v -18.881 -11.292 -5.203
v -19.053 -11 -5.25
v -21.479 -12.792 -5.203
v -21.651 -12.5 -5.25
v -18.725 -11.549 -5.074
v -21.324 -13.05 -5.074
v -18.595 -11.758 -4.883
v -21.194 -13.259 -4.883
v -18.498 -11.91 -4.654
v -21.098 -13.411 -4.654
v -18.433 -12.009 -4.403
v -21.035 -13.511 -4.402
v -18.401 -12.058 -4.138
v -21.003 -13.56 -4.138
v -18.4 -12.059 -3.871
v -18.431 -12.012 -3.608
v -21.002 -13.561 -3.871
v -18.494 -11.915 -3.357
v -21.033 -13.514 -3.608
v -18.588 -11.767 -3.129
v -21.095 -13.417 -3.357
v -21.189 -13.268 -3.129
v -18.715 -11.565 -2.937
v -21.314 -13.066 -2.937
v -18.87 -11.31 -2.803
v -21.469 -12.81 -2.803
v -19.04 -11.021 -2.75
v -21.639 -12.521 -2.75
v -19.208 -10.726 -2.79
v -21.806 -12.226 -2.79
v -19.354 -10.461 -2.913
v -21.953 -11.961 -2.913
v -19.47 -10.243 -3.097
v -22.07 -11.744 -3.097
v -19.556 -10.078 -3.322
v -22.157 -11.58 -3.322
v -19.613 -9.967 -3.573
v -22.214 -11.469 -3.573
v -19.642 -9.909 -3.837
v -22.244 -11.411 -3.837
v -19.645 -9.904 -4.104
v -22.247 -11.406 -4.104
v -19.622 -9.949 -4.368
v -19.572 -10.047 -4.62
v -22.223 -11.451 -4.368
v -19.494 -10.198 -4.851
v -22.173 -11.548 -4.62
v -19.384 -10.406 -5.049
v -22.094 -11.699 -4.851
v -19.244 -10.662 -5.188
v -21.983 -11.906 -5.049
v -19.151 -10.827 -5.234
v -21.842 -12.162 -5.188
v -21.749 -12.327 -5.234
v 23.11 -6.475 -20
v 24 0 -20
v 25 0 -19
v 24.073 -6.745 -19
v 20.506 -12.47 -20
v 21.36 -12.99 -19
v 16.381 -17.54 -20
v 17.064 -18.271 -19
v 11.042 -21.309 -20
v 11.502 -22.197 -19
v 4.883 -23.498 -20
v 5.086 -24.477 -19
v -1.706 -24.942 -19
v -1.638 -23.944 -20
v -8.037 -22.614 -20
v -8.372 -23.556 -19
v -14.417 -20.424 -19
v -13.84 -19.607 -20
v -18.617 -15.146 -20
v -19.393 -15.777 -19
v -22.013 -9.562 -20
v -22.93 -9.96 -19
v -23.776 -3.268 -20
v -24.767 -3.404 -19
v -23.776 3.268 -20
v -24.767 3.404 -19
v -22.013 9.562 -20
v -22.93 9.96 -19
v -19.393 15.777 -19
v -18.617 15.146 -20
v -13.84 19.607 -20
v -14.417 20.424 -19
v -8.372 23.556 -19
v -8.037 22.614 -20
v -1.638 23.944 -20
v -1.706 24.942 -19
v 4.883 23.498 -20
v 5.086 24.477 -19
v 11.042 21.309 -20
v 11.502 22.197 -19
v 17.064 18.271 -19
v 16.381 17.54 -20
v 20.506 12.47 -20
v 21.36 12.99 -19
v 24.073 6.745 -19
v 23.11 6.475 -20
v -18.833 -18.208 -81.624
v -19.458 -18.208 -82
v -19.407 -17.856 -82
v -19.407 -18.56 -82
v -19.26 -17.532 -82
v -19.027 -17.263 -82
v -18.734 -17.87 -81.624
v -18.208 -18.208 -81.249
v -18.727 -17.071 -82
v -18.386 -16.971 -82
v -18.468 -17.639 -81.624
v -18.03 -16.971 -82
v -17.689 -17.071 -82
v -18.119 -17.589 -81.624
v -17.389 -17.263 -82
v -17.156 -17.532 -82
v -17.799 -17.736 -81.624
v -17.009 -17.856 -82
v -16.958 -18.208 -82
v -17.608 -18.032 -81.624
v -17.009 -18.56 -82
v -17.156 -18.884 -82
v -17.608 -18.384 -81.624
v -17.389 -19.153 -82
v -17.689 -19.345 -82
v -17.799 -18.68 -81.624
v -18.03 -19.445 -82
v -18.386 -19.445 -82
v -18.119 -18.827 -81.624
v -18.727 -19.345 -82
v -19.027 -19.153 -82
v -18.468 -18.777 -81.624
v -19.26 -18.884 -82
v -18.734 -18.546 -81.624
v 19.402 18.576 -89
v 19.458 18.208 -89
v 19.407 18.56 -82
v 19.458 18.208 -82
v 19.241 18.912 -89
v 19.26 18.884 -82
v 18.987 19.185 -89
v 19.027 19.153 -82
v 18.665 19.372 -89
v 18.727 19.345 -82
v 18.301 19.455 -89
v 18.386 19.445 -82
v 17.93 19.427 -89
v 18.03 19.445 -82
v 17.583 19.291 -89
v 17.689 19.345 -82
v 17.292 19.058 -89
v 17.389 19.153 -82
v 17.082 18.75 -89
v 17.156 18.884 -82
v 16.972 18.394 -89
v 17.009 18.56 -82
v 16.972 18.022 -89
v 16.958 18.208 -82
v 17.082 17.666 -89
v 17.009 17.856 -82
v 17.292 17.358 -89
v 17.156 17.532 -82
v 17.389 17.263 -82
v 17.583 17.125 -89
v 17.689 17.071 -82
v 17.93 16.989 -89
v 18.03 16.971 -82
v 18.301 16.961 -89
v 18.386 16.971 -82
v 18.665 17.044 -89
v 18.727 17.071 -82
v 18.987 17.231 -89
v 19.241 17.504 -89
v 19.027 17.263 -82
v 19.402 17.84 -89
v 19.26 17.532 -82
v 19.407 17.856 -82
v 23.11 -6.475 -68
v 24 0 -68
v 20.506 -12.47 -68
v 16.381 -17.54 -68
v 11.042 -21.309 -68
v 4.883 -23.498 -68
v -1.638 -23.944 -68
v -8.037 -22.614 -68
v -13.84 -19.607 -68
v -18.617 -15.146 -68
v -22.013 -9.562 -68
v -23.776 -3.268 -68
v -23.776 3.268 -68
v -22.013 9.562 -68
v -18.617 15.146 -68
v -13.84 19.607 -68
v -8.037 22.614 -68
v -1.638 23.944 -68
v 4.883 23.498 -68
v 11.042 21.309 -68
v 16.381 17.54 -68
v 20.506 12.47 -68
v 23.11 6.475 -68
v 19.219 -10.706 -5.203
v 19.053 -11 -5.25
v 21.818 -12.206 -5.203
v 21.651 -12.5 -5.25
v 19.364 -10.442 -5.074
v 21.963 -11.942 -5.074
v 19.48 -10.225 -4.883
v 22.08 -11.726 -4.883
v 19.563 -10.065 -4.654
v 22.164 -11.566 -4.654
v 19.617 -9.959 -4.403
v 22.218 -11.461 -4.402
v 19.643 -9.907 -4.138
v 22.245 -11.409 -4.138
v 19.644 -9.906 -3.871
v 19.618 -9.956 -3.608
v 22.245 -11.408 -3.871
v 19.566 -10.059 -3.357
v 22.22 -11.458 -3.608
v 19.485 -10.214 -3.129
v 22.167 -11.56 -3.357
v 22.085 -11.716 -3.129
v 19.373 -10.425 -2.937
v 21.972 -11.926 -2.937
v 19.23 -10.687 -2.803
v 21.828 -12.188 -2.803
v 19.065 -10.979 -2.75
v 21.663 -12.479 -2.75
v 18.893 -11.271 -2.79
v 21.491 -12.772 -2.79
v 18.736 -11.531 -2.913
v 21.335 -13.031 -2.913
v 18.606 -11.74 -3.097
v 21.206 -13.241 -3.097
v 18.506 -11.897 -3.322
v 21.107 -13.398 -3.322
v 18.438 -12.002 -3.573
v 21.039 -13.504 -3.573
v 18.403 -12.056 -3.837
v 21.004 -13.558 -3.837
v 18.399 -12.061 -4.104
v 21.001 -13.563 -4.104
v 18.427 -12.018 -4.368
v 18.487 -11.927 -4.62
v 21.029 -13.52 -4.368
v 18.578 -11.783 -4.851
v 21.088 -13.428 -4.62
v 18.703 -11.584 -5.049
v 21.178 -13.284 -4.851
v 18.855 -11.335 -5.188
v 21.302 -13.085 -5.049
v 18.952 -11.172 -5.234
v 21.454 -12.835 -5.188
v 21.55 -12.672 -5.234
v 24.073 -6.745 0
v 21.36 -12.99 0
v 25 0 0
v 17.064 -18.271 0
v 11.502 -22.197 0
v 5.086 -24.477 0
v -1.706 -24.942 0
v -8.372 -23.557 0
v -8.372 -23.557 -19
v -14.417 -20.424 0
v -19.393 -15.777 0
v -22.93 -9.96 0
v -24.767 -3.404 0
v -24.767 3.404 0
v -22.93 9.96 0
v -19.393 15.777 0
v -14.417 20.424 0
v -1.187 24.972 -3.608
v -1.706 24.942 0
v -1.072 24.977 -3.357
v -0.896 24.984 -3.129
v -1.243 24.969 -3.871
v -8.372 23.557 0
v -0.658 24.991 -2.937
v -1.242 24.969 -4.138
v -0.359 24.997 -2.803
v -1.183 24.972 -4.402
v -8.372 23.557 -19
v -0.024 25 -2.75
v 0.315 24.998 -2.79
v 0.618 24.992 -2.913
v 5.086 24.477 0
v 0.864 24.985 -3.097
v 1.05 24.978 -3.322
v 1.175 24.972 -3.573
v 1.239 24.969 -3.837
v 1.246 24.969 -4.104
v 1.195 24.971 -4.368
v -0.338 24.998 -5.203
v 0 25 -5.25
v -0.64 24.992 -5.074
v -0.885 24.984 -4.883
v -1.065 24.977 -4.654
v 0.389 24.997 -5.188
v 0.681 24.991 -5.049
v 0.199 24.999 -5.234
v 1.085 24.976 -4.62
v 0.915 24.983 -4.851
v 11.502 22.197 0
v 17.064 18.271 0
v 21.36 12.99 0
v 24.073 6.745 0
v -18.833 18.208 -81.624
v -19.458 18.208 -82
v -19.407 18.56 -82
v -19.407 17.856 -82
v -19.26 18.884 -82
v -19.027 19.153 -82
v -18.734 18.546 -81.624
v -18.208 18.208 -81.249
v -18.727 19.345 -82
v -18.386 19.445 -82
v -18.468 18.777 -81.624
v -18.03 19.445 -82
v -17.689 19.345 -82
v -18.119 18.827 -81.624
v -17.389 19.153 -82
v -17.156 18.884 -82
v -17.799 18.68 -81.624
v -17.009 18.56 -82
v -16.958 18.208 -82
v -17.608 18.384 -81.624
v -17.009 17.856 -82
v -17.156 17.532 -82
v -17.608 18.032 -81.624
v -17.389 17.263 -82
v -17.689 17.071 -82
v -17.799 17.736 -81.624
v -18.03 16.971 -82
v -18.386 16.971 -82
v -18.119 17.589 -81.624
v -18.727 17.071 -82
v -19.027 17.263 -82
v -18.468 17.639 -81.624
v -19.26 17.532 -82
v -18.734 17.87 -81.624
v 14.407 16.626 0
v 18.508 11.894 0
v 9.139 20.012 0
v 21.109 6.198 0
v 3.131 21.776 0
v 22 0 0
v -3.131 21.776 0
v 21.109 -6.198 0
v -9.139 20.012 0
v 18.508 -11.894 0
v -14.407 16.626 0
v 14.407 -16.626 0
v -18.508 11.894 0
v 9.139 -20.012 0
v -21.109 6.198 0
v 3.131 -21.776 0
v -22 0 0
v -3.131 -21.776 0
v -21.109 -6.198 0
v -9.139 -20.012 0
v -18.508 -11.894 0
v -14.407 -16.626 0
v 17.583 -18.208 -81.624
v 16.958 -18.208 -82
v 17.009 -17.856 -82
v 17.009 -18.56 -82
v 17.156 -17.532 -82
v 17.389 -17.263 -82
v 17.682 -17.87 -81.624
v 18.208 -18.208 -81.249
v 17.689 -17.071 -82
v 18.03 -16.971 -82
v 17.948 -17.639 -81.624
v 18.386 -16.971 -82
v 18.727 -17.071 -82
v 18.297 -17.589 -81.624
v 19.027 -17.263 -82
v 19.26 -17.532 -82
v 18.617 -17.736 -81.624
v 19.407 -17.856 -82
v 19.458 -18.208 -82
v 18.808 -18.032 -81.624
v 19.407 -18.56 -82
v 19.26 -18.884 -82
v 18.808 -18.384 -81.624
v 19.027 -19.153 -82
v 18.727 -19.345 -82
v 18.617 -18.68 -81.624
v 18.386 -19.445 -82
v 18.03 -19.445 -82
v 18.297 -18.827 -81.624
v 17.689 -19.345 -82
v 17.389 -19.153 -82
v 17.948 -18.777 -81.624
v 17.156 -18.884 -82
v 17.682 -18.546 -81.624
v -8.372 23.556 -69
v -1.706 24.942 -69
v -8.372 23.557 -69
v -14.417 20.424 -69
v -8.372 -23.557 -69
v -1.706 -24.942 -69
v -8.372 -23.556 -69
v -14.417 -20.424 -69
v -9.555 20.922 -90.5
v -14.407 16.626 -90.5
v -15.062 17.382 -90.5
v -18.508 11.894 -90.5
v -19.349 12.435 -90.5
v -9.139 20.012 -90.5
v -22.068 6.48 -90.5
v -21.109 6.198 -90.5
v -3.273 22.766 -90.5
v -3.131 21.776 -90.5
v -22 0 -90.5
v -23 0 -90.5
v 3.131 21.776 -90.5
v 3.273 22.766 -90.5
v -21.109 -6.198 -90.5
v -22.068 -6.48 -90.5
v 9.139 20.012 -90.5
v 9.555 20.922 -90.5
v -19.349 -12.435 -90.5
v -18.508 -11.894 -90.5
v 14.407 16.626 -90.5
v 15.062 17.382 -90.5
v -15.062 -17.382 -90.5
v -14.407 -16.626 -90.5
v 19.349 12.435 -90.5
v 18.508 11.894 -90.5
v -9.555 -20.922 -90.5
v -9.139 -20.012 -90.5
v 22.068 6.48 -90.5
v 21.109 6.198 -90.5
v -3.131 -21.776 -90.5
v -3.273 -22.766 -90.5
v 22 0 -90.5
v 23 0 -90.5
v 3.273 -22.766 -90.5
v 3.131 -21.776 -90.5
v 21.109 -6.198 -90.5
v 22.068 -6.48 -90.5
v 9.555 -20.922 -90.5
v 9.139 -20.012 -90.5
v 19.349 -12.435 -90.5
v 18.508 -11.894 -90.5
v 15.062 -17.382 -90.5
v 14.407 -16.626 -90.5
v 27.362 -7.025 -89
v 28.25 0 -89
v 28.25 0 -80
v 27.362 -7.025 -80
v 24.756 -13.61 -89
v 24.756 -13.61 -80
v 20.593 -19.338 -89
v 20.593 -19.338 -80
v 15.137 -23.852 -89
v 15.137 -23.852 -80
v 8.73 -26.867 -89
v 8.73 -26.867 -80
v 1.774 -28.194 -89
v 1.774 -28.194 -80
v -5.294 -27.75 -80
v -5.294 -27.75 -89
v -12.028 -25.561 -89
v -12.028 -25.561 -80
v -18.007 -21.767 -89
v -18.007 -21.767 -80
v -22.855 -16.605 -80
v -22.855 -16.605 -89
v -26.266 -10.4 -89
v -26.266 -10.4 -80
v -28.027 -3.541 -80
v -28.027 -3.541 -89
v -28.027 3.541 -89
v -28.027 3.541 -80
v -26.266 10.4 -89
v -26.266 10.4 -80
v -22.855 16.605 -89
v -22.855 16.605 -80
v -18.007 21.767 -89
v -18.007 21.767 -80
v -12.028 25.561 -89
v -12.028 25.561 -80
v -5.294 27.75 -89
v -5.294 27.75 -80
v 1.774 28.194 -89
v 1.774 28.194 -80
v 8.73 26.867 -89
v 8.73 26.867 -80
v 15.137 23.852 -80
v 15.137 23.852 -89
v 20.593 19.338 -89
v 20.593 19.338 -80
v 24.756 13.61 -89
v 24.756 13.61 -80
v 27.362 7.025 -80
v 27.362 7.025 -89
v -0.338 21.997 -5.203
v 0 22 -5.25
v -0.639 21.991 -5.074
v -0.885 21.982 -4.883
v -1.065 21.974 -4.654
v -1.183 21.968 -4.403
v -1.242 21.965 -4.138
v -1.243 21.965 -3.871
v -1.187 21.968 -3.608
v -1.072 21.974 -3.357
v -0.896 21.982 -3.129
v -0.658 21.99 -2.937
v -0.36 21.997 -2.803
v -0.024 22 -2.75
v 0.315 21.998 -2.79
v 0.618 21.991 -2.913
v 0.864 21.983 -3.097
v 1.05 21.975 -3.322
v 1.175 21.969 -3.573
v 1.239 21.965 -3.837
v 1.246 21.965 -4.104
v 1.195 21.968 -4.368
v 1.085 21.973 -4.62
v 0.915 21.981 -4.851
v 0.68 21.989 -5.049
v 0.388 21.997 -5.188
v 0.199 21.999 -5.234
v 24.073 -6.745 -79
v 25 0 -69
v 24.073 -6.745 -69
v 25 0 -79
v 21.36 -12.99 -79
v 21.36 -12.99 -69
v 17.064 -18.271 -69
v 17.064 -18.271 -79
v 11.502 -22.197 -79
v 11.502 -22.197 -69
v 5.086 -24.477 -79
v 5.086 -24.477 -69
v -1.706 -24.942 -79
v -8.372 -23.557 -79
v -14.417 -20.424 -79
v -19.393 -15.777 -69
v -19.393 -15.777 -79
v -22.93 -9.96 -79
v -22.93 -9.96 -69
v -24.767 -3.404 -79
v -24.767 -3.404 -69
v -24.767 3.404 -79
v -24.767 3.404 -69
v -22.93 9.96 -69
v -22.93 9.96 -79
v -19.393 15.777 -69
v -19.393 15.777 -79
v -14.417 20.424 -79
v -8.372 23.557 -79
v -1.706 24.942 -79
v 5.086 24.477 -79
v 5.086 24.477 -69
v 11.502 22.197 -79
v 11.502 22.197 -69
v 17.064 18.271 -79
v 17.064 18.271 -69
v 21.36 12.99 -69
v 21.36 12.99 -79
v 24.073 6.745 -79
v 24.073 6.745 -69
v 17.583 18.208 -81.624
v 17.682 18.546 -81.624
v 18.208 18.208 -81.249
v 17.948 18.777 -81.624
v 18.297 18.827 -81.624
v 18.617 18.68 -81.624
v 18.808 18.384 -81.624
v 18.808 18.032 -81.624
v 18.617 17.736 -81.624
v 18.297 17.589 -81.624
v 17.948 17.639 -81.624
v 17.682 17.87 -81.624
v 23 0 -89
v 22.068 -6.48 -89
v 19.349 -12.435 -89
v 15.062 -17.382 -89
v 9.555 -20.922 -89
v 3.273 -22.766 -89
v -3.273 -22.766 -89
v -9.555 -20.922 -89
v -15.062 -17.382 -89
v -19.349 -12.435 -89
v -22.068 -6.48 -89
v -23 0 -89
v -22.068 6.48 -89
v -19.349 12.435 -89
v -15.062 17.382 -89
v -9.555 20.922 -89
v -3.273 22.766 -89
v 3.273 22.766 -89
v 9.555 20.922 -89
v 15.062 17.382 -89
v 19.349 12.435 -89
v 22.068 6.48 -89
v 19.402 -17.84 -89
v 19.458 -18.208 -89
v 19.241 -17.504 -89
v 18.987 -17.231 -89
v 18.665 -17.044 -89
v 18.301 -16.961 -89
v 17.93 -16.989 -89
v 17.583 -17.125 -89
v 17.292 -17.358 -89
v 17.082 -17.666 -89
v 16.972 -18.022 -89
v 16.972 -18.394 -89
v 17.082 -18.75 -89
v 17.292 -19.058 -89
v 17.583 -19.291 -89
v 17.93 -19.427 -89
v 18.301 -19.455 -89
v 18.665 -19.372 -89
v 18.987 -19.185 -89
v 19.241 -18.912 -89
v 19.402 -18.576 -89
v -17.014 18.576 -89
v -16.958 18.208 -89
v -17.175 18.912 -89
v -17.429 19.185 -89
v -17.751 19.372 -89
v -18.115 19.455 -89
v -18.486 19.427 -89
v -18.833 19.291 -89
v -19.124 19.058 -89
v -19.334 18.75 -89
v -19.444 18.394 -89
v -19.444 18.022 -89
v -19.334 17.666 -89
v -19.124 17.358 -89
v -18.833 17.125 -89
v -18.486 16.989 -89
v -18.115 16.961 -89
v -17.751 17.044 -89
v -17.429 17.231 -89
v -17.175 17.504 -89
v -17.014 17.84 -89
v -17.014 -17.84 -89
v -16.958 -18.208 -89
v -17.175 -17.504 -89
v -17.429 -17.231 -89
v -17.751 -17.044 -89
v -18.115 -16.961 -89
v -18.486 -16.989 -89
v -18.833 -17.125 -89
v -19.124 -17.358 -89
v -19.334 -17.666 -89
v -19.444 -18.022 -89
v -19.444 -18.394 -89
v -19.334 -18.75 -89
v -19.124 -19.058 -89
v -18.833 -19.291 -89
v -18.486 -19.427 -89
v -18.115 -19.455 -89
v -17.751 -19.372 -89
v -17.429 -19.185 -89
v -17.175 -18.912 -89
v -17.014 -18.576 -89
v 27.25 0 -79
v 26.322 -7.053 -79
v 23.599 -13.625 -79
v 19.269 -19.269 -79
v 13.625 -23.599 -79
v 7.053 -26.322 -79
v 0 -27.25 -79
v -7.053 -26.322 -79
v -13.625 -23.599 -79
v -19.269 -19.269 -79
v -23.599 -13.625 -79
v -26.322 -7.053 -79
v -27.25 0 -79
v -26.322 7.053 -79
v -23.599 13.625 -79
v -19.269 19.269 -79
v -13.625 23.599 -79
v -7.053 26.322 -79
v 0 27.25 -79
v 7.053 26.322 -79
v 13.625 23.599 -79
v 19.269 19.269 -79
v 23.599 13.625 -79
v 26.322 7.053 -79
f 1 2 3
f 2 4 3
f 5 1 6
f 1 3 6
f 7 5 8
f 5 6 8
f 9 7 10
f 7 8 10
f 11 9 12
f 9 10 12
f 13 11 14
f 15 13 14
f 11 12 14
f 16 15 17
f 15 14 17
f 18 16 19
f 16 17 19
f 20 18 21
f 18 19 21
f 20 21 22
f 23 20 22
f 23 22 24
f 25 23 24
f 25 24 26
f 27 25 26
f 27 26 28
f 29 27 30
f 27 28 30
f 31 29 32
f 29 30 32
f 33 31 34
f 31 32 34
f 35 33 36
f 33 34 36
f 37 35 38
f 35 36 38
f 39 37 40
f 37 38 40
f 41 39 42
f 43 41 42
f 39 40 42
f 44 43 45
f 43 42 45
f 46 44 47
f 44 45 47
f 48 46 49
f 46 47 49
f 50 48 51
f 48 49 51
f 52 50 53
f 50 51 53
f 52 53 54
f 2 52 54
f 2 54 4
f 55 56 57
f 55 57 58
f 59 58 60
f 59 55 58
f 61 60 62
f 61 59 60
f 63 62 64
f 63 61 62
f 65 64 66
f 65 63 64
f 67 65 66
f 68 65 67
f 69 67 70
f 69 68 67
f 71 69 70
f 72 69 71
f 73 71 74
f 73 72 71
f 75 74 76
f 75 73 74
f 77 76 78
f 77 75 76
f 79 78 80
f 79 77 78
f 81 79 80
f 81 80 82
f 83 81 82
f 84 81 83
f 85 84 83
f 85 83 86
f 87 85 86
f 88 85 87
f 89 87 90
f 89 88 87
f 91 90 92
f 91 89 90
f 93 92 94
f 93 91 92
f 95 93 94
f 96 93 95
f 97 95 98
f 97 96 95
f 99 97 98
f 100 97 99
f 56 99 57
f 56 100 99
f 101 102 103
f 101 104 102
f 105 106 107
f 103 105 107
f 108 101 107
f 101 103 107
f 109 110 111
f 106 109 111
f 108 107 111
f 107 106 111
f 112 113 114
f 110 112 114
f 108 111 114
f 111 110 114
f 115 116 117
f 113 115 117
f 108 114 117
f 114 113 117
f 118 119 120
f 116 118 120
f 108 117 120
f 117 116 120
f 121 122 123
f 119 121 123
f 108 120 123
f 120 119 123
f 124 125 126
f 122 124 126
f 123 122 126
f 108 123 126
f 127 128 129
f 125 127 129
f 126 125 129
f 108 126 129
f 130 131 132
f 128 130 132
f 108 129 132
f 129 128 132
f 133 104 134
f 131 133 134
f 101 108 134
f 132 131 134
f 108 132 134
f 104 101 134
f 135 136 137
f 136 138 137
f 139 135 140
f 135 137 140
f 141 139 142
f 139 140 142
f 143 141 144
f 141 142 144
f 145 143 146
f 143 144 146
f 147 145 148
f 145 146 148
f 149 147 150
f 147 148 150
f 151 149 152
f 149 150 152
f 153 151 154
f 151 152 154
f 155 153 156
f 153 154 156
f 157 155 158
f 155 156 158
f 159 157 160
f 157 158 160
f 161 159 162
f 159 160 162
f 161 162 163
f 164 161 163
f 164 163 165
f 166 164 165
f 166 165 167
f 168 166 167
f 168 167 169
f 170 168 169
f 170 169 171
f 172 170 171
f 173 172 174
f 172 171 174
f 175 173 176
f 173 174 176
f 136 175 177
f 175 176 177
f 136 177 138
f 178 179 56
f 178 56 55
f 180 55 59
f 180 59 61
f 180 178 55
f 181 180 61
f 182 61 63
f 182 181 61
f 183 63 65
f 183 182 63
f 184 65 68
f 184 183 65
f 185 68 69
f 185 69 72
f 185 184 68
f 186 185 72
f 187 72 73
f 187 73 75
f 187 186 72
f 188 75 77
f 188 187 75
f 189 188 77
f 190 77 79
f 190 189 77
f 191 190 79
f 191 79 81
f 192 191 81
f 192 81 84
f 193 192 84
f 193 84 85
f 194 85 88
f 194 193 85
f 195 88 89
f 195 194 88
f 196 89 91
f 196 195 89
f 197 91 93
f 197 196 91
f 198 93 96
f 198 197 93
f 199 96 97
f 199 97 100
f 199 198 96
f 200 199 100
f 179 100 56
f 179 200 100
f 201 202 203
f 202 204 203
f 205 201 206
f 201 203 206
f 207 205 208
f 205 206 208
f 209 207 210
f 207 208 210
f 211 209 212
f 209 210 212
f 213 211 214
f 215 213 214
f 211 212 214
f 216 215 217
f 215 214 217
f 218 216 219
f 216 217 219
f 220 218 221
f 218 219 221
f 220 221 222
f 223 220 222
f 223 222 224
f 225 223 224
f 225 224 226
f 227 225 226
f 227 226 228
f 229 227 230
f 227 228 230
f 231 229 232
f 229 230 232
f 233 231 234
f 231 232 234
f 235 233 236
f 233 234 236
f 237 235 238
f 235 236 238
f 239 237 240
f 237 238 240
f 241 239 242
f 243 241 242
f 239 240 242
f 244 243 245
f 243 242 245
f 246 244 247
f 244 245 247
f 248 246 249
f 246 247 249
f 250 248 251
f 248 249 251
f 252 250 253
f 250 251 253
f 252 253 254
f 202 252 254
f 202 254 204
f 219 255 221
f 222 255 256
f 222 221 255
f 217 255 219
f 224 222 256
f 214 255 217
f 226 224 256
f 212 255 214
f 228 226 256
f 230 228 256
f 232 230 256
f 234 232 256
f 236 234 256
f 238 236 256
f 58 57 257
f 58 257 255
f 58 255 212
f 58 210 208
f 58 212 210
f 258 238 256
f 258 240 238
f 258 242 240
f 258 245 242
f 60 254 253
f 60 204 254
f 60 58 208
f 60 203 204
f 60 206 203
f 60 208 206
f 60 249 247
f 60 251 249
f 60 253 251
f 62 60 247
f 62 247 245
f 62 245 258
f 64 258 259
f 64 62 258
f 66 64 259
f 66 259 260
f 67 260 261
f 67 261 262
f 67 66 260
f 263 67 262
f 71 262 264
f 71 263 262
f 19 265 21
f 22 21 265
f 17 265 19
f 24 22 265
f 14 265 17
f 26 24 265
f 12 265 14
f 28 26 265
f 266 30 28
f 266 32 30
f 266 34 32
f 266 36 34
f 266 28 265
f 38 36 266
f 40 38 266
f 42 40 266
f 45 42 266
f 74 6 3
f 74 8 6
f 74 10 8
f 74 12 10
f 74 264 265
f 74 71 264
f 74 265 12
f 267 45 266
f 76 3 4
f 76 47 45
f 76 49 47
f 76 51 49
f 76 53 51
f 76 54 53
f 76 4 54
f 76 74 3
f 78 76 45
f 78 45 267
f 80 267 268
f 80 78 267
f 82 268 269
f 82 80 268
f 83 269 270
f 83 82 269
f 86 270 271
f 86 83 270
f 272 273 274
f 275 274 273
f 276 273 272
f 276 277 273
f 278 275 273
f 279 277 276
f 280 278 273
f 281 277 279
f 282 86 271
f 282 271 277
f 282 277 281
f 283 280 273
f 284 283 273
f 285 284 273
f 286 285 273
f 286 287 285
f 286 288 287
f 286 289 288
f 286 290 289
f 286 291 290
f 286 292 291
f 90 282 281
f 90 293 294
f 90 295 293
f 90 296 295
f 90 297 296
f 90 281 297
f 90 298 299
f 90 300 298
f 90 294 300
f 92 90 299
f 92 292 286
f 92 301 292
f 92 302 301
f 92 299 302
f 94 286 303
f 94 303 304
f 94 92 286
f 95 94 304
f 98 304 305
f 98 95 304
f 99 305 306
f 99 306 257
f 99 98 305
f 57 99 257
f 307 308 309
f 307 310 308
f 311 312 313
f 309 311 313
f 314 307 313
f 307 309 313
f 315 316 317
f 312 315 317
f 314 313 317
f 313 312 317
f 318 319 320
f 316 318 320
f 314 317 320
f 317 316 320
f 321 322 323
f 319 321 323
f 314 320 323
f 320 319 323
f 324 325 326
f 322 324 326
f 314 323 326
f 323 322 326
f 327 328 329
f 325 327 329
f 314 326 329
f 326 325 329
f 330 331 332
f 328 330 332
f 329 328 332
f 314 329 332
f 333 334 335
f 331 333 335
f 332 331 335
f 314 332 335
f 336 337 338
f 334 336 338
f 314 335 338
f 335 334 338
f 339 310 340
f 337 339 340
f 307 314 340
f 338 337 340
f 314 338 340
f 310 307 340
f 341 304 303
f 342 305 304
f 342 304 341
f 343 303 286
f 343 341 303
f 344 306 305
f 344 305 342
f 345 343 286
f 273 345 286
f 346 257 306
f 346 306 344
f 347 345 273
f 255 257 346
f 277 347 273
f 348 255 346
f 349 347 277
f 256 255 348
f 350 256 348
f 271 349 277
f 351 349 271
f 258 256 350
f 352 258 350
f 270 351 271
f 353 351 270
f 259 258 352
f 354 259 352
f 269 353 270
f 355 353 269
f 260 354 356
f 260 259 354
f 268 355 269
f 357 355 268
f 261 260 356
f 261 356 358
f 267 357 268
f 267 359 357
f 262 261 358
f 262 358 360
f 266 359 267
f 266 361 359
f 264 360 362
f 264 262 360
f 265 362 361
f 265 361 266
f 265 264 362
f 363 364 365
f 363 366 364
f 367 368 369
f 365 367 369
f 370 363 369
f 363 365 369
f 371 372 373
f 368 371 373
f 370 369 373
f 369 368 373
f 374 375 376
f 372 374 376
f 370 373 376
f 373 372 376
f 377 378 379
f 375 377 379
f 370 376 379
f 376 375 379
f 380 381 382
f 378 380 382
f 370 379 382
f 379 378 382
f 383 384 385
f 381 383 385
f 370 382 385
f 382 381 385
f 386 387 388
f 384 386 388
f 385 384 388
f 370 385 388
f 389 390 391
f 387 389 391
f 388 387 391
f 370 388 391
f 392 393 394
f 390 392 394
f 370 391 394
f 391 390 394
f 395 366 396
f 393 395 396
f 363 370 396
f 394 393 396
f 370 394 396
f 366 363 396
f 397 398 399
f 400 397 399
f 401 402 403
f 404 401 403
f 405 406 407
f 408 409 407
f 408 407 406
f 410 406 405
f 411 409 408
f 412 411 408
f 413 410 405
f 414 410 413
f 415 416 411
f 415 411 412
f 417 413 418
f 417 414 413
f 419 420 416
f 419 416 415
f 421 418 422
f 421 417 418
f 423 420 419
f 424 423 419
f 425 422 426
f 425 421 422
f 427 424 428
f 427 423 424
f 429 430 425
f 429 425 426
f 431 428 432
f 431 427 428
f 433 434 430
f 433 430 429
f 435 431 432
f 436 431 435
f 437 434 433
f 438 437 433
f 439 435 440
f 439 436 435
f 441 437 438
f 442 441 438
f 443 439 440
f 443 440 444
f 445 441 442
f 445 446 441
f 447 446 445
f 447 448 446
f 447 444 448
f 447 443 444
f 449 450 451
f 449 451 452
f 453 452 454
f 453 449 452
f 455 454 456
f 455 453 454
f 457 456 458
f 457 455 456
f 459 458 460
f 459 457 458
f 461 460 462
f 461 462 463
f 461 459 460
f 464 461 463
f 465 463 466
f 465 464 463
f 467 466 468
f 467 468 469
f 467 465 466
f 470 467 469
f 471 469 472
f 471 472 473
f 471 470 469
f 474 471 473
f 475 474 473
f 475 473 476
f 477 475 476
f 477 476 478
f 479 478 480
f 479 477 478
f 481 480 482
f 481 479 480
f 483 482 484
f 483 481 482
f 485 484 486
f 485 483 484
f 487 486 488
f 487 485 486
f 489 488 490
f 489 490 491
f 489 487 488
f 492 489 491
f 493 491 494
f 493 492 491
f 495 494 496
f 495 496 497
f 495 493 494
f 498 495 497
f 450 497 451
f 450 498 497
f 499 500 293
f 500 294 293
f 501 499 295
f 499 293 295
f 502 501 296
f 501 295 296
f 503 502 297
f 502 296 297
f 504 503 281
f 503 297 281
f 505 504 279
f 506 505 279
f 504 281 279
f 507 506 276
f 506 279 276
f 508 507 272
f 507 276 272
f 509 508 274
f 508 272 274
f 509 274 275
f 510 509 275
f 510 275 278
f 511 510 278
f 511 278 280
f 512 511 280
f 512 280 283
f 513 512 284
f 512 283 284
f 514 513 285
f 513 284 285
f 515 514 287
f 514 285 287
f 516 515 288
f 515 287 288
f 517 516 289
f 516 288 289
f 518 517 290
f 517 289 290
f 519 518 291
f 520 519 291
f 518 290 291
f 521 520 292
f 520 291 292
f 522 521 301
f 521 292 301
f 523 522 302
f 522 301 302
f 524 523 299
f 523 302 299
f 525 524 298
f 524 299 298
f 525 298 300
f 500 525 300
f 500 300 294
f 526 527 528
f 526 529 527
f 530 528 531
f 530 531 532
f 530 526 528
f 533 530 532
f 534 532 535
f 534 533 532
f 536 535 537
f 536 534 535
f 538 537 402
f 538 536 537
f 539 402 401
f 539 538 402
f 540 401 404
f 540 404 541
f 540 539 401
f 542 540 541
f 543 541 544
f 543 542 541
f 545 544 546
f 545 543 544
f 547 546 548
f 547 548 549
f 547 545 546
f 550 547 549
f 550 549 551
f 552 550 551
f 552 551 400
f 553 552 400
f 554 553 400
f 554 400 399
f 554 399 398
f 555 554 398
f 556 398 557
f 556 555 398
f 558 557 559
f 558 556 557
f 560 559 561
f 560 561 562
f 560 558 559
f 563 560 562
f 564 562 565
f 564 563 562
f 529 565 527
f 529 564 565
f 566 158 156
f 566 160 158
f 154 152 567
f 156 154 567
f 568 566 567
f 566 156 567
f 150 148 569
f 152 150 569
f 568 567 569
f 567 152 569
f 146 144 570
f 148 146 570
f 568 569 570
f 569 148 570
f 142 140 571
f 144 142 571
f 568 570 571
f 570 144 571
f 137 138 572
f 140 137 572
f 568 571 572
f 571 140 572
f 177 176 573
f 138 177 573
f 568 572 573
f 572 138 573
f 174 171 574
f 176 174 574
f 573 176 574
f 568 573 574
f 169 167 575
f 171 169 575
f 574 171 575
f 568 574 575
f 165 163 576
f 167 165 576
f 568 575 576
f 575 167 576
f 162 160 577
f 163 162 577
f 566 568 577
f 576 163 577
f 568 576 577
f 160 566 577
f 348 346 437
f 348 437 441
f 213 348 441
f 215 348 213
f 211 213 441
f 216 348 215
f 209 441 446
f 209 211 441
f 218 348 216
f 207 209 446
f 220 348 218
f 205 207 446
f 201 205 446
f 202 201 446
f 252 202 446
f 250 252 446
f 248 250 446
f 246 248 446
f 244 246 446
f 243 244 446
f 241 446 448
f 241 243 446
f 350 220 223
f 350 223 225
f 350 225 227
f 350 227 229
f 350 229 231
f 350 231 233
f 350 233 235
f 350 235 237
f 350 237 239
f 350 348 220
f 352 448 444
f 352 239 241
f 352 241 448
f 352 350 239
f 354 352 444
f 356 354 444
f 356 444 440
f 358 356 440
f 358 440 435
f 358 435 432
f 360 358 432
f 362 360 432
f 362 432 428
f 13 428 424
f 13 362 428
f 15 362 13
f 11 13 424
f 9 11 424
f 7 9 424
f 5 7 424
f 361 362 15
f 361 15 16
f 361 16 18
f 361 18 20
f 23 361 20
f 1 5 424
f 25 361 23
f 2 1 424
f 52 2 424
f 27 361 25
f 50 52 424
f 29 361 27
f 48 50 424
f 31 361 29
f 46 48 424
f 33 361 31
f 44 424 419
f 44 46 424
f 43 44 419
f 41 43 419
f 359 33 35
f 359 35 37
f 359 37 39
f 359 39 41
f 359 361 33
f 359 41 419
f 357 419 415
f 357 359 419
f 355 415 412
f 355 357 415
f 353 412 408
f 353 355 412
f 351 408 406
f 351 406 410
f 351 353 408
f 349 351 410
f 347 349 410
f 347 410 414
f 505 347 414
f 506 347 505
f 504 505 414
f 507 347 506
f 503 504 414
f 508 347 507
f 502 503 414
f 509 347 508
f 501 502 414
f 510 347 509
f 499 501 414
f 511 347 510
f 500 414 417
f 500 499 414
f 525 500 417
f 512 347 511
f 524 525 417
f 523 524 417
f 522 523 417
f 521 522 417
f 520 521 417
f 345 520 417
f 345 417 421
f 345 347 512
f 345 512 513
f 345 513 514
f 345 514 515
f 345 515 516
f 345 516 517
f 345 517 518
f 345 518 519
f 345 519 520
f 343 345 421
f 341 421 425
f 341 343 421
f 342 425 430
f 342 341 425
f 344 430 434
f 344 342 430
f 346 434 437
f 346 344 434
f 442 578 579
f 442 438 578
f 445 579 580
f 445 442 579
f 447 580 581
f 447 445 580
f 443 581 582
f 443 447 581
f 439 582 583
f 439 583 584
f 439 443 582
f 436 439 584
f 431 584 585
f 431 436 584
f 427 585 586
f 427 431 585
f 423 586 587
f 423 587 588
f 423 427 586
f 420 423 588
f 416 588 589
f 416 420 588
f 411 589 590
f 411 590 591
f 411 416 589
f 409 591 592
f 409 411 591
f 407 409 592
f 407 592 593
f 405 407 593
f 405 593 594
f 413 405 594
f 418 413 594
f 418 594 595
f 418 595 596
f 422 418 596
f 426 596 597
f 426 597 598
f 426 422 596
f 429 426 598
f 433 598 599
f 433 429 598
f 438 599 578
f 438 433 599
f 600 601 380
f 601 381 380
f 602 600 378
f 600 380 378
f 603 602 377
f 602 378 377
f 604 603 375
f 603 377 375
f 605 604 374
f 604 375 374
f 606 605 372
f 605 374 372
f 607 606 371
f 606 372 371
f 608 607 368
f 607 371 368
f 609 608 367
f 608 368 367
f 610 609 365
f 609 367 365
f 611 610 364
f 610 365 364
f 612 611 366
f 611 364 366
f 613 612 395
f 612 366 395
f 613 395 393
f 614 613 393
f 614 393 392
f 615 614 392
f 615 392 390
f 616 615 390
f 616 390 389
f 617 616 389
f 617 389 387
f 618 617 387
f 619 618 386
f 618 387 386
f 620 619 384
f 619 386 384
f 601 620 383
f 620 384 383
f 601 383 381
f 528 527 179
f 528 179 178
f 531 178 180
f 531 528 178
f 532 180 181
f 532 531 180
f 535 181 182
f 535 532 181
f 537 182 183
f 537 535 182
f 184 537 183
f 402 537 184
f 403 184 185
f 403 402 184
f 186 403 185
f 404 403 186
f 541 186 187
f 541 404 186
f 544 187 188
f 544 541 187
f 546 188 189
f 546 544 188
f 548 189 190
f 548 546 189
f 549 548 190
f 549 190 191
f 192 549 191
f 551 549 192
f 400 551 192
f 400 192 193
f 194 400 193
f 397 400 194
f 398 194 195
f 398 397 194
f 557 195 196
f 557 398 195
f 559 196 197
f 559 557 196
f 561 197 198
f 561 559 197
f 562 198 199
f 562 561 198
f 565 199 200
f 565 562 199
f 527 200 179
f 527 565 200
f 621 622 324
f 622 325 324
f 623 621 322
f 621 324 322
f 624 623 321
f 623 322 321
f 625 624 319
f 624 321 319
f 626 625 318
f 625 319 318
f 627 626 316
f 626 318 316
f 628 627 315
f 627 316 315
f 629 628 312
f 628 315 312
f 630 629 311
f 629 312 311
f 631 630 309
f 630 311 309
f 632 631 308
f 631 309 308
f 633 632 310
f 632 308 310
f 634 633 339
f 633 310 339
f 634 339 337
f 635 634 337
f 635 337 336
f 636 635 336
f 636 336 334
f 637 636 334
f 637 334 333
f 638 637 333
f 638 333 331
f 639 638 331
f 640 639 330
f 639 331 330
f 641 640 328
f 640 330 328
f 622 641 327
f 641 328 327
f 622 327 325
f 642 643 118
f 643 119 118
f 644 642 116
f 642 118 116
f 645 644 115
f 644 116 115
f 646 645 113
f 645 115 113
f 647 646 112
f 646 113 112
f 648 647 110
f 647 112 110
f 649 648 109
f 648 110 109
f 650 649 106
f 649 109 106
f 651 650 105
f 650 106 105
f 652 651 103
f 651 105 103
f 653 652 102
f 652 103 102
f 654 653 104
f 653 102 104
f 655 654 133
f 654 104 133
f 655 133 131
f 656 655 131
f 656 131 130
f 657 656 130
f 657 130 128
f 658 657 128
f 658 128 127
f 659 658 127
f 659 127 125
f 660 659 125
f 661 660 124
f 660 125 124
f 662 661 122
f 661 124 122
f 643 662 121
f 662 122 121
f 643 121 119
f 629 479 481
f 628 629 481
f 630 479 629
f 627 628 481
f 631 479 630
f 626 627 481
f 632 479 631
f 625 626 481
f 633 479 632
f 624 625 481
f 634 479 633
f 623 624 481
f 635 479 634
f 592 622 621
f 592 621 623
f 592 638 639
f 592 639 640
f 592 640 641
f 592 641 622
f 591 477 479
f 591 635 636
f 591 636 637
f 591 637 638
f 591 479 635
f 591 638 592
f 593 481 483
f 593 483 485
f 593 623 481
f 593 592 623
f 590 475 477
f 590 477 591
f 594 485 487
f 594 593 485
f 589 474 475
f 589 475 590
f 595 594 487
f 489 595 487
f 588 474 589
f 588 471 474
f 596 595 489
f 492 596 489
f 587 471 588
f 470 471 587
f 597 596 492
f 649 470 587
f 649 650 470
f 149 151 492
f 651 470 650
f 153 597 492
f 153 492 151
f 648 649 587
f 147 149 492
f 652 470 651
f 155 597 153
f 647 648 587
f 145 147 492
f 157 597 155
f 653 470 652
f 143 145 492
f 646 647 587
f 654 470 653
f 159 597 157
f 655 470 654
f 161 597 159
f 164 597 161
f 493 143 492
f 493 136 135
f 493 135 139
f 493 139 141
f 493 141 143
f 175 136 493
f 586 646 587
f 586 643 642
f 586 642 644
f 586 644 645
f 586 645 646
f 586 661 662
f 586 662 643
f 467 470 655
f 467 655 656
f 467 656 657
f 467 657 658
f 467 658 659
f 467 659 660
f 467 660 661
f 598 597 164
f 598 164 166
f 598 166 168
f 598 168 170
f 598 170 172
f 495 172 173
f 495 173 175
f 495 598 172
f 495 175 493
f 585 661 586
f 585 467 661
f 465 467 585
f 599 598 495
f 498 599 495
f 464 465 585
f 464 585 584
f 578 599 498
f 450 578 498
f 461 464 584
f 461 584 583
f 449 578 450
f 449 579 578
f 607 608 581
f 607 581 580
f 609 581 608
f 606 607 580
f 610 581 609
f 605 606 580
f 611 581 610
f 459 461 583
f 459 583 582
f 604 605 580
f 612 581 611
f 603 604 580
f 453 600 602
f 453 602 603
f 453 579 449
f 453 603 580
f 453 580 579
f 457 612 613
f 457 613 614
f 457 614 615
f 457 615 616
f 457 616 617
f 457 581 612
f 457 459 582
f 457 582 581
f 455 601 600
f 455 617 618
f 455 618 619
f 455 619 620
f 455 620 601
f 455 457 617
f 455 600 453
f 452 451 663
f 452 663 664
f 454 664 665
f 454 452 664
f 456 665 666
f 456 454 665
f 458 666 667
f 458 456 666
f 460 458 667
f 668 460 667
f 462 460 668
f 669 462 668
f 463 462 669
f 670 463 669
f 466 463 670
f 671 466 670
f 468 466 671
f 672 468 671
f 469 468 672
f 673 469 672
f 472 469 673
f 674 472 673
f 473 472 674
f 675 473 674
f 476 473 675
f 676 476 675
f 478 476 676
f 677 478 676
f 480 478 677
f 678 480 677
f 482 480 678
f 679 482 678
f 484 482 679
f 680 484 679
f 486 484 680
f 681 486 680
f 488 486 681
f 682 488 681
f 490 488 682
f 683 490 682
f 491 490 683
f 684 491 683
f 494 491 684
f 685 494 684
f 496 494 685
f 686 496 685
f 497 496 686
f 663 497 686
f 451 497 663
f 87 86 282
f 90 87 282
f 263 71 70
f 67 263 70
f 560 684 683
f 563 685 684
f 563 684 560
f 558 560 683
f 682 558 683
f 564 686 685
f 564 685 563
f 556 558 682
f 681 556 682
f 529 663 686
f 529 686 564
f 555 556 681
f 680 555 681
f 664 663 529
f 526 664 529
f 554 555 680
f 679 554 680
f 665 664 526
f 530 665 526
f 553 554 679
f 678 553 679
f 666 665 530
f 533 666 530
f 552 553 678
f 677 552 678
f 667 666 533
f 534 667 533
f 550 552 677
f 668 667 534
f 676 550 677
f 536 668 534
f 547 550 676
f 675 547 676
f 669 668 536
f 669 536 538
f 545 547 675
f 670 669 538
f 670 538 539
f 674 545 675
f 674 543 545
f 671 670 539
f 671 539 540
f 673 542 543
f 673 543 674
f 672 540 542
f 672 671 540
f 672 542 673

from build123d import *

# Parameters (mm, degrees)
HOLE_WIZARD_M3_1_D       = 2.5
HOLE_WIZARD_M3_1_DEPTH   = 7
HOLE_WIZARD_M3_1_TIP     = 0.751075774
CHAMFER_2_SIZE           = 1
SKETCH_20_W              = 1.25
SKETCH_20_H              = 28.25
PATTERN_CIRCULAR_1_COUNT = 3


with BuildPart() as part:
    # 草图1 → 旋转1 (revolve)
    with BuildSketch(Plane(origin=(0, 0, 0), x_dir=(1, 0, 0), z_dir=(0, 1, 0))):
        Polygon((25, 0), (25, 19), (24, 19), (24, 69), (25, 69), (25, 79), (28.25, 79), (28.25, 89), (23, 89), (23, 90.5), (22, 90.5), (22, 0), align=None)
    revolve(axis=Axis((0, 0, 0), (0, 0, -1)))

    # M3 螺纹孔1
    with Locations(Plane(origin=(0, 0, -89), x_dir=(-1, 0, 0), z_dir=(0, 0, -1))):
        with Locations((-18.207999616, 18.207999616), (18.207999616, 18.207999616), (18.207999616, -18.207999616), (-18.207999616, -18.207999616)):
            Hole(HOLE_WIZARD_M3_1_D / 2, depth=HOLE_WIZARD_M3_1_DEPTH)
            with Locations((0, 0, -(HOLE_WIZARD_M3_1_DEPTH + HOLE_WIZARD_M3_1_TIP / 2))):  # 118° drill point
                Cone(0, HOLE_WIZARD_M3_1_D / 2, HOLE_WIZARD_M3_1_TIP, mode=Mode.SUBTRACT)

    # 倒角2
    chamfer_2_edges = [part.edges().sort_by_distance(p)[0] for p in [
        (-28.25, 0, -79),
        (-24, 0, -69),
        (-24, 0, -19),
    ]]
    chamfer(chamfer_2_edges, length=CHAMFER_2_SIZE - 0.0001)  # a hair under: the kernel refuses the full size

    # 草图20 → M3 螺纹孔2 (revolve, cut)
    with BuildSketch(Plane(origin=(0, 0, -4), x_dir=(0, 0, -1), z_dir=(1, 0, 0))):
        with Locations((0.625, 14.125)):
            Rectangle(SKETCH_20_W, SKETCH_20_H)
    hole_wizard_m3_2 = revolve(axis=Axis((0, -6.35, -4), (0, 1, 0)), mode=Mode.SUBTRACT)

    # 阵列(圆周)1: M3 螺纹孔2 ×3 about axis
    pattern_circular_1_axis = Axis((0, 0, 0), (0, 0, 1))
    for i in range(1, PATTERN_CIRCULAR_1_COUNT):
        add(hole_wizard_m3_2.rotate(pattern_circular_1_axis, i * 360 / PATTERN_CIRCULAR_1_COUNT), mode=Mode.SUBTRACT)


solid = part.part
